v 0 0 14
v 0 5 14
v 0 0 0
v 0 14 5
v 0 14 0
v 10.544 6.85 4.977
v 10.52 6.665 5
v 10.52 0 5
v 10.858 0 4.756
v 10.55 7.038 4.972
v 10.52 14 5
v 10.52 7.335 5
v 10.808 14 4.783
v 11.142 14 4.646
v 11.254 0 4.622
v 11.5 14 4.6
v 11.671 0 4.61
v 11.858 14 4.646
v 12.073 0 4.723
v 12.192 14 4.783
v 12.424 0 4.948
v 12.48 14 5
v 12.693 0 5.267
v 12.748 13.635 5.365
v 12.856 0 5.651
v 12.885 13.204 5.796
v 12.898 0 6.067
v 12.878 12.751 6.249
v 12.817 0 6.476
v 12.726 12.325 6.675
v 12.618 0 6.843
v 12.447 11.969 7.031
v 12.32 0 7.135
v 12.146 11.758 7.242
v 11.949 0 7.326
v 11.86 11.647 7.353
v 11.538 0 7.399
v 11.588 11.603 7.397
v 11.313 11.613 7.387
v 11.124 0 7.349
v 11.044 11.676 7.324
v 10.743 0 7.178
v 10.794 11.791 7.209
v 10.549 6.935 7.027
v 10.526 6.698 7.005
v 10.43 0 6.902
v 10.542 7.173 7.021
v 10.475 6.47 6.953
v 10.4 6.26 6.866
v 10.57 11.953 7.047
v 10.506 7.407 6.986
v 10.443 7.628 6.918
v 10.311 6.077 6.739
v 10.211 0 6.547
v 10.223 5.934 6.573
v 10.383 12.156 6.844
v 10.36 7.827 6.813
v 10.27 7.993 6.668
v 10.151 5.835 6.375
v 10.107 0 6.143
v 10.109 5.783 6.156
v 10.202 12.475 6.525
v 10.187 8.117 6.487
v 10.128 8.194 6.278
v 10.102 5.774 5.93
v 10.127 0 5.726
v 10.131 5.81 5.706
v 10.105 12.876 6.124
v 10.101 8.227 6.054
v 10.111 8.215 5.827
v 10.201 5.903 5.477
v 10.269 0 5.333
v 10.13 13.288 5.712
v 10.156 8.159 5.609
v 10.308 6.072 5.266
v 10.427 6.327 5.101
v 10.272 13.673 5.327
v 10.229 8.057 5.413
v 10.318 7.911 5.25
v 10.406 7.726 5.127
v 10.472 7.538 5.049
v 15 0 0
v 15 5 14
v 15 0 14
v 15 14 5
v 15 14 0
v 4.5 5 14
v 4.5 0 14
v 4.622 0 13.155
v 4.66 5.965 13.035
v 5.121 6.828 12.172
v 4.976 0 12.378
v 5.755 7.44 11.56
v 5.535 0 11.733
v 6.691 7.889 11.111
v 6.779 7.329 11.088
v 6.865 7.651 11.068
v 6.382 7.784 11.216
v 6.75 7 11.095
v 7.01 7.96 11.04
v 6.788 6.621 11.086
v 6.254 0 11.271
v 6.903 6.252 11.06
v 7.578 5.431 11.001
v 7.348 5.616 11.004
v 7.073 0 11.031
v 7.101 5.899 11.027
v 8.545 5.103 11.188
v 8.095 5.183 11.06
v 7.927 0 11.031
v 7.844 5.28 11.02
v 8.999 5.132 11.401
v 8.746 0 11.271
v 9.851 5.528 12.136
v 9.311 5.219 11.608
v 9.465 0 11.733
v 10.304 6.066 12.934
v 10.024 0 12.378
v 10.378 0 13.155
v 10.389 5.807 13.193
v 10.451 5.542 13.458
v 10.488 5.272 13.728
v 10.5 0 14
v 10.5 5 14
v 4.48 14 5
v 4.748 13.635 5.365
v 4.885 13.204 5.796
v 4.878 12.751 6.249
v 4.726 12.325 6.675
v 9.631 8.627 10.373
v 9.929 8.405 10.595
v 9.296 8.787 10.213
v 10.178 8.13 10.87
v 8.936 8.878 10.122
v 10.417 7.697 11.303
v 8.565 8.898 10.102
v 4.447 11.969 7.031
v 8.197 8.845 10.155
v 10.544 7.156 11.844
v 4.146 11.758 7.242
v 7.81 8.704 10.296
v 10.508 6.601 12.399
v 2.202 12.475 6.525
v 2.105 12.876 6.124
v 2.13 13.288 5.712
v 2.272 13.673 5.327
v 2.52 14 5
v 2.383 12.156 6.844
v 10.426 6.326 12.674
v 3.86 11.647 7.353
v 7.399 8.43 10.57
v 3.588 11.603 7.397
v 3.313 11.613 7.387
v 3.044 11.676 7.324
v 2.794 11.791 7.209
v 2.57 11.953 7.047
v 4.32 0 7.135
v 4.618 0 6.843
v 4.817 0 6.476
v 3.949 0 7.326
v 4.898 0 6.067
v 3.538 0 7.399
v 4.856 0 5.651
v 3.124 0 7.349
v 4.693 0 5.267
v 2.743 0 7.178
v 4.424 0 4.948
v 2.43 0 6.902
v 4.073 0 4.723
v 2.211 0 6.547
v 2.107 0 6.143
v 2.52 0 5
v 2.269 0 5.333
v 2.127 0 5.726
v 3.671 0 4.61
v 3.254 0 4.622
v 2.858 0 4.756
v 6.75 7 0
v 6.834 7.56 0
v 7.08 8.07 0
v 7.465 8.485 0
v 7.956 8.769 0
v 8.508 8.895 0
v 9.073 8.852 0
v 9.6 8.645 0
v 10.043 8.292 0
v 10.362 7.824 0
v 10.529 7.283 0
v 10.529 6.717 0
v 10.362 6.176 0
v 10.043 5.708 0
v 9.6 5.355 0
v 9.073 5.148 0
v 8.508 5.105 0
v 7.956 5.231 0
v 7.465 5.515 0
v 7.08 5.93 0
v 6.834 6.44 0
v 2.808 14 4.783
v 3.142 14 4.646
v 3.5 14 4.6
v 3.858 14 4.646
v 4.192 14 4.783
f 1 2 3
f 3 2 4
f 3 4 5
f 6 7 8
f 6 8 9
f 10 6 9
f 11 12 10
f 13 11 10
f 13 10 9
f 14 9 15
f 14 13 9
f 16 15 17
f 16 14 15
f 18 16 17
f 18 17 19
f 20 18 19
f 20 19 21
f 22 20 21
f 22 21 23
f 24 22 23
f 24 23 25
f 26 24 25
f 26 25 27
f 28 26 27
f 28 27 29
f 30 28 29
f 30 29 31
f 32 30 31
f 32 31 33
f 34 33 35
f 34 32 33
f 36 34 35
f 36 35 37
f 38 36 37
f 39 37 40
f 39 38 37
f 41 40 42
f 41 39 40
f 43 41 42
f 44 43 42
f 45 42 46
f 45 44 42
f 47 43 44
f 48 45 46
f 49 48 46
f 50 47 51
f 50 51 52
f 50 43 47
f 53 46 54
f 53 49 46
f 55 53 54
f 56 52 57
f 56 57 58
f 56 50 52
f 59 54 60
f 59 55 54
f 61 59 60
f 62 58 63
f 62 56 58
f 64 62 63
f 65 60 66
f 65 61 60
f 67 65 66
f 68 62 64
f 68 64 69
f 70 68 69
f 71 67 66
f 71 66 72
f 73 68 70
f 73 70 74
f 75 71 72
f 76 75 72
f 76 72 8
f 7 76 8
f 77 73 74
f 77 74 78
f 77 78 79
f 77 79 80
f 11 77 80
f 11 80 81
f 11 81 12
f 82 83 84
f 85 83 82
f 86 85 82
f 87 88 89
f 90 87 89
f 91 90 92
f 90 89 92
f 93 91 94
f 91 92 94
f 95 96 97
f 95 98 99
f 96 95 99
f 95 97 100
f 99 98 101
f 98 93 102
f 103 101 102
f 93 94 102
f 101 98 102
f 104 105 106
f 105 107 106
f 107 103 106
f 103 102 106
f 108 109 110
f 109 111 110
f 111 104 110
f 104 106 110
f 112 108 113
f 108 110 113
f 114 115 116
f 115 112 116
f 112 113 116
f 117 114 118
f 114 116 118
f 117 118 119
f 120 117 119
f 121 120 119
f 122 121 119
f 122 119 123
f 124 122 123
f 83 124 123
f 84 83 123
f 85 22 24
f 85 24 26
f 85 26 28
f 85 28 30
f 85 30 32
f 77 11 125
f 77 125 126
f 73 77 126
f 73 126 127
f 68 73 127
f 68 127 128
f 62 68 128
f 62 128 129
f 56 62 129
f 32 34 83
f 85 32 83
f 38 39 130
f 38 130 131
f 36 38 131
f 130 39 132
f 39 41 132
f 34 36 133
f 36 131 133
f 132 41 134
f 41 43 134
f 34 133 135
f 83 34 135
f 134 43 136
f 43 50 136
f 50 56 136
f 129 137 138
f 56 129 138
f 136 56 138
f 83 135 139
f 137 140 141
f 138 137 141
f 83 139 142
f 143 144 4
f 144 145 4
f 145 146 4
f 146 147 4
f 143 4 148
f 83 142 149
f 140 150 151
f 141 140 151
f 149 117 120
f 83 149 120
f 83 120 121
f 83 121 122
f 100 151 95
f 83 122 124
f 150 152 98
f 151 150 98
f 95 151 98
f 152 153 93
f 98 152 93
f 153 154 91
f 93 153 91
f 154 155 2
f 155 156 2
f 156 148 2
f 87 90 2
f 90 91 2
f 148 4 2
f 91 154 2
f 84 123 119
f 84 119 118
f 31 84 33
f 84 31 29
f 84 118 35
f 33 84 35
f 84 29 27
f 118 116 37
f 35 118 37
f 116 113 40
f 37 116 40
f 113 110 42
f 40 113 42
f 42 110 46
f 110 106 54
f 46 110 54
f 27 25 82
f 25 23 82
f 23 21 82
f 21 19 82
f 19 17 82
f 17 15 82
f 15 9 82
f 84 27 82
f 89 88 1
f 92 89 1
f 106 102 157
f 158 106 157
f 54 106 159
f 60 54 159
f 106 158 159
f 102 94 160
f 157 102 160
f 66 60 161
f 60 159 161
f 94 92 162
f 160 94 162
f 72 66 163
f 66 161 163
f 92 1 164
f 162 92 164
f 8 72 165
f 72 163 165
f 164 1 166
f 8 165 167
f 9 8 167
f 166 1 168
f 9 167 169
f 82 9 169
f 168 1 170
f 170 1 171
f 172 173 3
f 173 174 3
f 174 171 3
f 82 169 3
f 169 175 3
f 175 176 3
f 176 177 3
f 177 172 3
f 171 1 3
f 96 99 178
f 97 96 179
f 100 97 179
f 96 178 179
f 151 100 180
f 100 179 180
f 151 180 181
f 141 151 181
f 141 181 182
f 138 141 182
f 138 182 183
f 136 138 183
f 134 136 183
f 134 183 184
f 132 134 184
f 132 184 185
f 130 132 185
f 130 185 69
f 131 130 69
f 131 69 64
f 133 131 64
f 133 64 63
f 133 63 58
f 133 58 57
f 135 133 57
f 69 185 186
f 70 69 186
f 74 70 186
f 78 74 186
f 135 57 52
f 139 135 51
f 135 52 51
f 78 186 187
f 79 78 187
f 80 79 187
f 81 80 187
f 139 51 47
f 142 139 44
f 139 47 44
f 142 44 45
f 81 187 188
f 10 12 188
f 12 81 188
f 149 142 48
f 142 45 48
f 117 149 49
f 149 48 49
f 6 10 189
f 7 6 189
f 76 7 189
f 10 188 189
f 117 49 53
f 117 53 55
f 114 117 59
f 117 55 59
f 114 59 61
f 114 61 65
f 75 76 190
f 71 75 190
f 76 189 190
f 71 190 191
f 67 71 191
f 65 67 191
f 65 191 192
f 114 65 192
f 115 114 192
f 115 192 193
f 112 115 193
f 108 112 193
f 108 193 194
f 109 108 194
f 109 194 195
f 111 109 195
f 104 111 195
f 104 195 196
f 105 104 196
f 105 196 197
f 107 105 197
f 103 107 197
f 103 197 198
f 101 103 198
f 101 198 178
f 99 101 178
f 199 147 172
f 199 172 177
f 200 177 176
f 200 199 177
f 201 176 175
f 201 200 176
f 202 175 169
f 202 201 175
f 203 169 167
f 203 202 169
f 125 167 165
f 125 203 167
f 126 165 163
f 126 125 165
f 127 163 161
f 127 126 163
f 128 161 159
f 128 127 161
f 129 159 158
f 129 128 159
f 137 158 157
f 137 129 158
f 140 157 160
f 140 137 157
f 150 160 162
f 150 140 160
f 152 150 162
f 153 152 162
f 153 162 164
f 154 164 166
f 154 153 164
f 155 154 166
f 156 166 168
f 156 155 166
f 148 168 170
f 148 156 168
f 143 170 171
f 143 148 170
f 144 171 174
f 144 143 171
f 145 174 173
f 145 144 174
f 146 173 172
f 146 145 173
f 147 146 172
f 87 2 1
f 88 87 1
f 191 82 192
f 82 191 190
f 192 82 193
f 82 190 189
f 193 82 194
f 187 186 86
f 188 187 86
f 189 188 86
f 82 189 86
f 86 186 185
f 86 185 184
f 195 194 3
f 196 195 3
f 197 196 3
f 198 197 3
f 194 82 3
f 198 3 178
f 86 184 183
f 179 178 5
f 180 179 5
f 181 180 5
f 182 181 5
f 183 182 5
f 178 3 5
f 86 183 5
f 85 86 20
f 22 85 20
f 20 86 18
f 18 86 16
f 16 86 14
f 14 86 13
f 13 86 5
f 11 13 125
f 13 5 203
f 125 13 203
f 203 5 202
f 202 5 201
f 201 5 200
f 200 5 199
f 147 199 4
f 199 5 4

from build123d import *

# Parameters (mm, degrees)
EXTRUDE_1_DEPTH          = 15
CUT_EXTRUDE_1_DEPTH      = 25.839484697
CUT_EXTRUDE_1_DEPTH_BACK = 25.839484697
SKETCH_2_R               = 1.4
SKETCH_3_R               = 1.9
CUT_EXTRUDE_2_DEPTH      = 25.839484697
SKETCH_4_R               = 3
CUT_EXTRUDE_3_DEPTH      = 25.839484753


with BuildPart() as part:
    # 草图1 → 凸台-拉伸1 (new body)
    with BuildSketch(Plane(origin=(0, 0, 0), x_dir=(0, 0, -1), z_dir=(1, 0, 0))):
        Polygon((-14, 0), (0, 0), (0, 14), (-5, 14), (-14, 5), align=None)
    extrude(amount=EXTRUDE_1_DEPTH)

    # 草图2 → 切除-拉伸1 (cut, two sides: drawn at the far end of the back side and taken through both)
    with BuildSketch(Plane.XZ.offset(-CUT_EXTRUDE_1_DEPTH_BACK)):
        with Locations(Location((11.5, 6, 0), (0, 0, 225.584691403))):
            Circle(SKETCH_2_R)
        with Locations(Location((3.5, 6, 0), (0, 0, 225.584691403))):
            Circle(SKETCH_2_R)
    extrude(amount=CUT_EXTRUDE_1_DEPTH + CUT_EXTRUDE_1_DEPTH_BACK, mode=Mode.SUBTRACT)

    # 草图3 → 切除-拉伸2 (cut, through all)
    with BuildSketch(Plane(origin=(0, 0, 0), x_dir=(-1, 0, 0), z_dir=(0, 0, -1))):
        with Locations((-8.65, 7)):
            Circle(SKETCH_3_R)
    extrude(amount=-CUT_EXTRUDE_2_DEPTH, mode=Mode.SUBTRACT)

    # 草图4 → 切除-拉伸3 (cut, through all)
    with BuildSketch(Plane.XZ):
        with Locations((7.5, 14)):
            Circle(SKETCH_4_R)
    extrude(amount=-CUT_EXTRUDE_3_DEPTH, mode=Mode.SUBTRACT)


solid = part.part
